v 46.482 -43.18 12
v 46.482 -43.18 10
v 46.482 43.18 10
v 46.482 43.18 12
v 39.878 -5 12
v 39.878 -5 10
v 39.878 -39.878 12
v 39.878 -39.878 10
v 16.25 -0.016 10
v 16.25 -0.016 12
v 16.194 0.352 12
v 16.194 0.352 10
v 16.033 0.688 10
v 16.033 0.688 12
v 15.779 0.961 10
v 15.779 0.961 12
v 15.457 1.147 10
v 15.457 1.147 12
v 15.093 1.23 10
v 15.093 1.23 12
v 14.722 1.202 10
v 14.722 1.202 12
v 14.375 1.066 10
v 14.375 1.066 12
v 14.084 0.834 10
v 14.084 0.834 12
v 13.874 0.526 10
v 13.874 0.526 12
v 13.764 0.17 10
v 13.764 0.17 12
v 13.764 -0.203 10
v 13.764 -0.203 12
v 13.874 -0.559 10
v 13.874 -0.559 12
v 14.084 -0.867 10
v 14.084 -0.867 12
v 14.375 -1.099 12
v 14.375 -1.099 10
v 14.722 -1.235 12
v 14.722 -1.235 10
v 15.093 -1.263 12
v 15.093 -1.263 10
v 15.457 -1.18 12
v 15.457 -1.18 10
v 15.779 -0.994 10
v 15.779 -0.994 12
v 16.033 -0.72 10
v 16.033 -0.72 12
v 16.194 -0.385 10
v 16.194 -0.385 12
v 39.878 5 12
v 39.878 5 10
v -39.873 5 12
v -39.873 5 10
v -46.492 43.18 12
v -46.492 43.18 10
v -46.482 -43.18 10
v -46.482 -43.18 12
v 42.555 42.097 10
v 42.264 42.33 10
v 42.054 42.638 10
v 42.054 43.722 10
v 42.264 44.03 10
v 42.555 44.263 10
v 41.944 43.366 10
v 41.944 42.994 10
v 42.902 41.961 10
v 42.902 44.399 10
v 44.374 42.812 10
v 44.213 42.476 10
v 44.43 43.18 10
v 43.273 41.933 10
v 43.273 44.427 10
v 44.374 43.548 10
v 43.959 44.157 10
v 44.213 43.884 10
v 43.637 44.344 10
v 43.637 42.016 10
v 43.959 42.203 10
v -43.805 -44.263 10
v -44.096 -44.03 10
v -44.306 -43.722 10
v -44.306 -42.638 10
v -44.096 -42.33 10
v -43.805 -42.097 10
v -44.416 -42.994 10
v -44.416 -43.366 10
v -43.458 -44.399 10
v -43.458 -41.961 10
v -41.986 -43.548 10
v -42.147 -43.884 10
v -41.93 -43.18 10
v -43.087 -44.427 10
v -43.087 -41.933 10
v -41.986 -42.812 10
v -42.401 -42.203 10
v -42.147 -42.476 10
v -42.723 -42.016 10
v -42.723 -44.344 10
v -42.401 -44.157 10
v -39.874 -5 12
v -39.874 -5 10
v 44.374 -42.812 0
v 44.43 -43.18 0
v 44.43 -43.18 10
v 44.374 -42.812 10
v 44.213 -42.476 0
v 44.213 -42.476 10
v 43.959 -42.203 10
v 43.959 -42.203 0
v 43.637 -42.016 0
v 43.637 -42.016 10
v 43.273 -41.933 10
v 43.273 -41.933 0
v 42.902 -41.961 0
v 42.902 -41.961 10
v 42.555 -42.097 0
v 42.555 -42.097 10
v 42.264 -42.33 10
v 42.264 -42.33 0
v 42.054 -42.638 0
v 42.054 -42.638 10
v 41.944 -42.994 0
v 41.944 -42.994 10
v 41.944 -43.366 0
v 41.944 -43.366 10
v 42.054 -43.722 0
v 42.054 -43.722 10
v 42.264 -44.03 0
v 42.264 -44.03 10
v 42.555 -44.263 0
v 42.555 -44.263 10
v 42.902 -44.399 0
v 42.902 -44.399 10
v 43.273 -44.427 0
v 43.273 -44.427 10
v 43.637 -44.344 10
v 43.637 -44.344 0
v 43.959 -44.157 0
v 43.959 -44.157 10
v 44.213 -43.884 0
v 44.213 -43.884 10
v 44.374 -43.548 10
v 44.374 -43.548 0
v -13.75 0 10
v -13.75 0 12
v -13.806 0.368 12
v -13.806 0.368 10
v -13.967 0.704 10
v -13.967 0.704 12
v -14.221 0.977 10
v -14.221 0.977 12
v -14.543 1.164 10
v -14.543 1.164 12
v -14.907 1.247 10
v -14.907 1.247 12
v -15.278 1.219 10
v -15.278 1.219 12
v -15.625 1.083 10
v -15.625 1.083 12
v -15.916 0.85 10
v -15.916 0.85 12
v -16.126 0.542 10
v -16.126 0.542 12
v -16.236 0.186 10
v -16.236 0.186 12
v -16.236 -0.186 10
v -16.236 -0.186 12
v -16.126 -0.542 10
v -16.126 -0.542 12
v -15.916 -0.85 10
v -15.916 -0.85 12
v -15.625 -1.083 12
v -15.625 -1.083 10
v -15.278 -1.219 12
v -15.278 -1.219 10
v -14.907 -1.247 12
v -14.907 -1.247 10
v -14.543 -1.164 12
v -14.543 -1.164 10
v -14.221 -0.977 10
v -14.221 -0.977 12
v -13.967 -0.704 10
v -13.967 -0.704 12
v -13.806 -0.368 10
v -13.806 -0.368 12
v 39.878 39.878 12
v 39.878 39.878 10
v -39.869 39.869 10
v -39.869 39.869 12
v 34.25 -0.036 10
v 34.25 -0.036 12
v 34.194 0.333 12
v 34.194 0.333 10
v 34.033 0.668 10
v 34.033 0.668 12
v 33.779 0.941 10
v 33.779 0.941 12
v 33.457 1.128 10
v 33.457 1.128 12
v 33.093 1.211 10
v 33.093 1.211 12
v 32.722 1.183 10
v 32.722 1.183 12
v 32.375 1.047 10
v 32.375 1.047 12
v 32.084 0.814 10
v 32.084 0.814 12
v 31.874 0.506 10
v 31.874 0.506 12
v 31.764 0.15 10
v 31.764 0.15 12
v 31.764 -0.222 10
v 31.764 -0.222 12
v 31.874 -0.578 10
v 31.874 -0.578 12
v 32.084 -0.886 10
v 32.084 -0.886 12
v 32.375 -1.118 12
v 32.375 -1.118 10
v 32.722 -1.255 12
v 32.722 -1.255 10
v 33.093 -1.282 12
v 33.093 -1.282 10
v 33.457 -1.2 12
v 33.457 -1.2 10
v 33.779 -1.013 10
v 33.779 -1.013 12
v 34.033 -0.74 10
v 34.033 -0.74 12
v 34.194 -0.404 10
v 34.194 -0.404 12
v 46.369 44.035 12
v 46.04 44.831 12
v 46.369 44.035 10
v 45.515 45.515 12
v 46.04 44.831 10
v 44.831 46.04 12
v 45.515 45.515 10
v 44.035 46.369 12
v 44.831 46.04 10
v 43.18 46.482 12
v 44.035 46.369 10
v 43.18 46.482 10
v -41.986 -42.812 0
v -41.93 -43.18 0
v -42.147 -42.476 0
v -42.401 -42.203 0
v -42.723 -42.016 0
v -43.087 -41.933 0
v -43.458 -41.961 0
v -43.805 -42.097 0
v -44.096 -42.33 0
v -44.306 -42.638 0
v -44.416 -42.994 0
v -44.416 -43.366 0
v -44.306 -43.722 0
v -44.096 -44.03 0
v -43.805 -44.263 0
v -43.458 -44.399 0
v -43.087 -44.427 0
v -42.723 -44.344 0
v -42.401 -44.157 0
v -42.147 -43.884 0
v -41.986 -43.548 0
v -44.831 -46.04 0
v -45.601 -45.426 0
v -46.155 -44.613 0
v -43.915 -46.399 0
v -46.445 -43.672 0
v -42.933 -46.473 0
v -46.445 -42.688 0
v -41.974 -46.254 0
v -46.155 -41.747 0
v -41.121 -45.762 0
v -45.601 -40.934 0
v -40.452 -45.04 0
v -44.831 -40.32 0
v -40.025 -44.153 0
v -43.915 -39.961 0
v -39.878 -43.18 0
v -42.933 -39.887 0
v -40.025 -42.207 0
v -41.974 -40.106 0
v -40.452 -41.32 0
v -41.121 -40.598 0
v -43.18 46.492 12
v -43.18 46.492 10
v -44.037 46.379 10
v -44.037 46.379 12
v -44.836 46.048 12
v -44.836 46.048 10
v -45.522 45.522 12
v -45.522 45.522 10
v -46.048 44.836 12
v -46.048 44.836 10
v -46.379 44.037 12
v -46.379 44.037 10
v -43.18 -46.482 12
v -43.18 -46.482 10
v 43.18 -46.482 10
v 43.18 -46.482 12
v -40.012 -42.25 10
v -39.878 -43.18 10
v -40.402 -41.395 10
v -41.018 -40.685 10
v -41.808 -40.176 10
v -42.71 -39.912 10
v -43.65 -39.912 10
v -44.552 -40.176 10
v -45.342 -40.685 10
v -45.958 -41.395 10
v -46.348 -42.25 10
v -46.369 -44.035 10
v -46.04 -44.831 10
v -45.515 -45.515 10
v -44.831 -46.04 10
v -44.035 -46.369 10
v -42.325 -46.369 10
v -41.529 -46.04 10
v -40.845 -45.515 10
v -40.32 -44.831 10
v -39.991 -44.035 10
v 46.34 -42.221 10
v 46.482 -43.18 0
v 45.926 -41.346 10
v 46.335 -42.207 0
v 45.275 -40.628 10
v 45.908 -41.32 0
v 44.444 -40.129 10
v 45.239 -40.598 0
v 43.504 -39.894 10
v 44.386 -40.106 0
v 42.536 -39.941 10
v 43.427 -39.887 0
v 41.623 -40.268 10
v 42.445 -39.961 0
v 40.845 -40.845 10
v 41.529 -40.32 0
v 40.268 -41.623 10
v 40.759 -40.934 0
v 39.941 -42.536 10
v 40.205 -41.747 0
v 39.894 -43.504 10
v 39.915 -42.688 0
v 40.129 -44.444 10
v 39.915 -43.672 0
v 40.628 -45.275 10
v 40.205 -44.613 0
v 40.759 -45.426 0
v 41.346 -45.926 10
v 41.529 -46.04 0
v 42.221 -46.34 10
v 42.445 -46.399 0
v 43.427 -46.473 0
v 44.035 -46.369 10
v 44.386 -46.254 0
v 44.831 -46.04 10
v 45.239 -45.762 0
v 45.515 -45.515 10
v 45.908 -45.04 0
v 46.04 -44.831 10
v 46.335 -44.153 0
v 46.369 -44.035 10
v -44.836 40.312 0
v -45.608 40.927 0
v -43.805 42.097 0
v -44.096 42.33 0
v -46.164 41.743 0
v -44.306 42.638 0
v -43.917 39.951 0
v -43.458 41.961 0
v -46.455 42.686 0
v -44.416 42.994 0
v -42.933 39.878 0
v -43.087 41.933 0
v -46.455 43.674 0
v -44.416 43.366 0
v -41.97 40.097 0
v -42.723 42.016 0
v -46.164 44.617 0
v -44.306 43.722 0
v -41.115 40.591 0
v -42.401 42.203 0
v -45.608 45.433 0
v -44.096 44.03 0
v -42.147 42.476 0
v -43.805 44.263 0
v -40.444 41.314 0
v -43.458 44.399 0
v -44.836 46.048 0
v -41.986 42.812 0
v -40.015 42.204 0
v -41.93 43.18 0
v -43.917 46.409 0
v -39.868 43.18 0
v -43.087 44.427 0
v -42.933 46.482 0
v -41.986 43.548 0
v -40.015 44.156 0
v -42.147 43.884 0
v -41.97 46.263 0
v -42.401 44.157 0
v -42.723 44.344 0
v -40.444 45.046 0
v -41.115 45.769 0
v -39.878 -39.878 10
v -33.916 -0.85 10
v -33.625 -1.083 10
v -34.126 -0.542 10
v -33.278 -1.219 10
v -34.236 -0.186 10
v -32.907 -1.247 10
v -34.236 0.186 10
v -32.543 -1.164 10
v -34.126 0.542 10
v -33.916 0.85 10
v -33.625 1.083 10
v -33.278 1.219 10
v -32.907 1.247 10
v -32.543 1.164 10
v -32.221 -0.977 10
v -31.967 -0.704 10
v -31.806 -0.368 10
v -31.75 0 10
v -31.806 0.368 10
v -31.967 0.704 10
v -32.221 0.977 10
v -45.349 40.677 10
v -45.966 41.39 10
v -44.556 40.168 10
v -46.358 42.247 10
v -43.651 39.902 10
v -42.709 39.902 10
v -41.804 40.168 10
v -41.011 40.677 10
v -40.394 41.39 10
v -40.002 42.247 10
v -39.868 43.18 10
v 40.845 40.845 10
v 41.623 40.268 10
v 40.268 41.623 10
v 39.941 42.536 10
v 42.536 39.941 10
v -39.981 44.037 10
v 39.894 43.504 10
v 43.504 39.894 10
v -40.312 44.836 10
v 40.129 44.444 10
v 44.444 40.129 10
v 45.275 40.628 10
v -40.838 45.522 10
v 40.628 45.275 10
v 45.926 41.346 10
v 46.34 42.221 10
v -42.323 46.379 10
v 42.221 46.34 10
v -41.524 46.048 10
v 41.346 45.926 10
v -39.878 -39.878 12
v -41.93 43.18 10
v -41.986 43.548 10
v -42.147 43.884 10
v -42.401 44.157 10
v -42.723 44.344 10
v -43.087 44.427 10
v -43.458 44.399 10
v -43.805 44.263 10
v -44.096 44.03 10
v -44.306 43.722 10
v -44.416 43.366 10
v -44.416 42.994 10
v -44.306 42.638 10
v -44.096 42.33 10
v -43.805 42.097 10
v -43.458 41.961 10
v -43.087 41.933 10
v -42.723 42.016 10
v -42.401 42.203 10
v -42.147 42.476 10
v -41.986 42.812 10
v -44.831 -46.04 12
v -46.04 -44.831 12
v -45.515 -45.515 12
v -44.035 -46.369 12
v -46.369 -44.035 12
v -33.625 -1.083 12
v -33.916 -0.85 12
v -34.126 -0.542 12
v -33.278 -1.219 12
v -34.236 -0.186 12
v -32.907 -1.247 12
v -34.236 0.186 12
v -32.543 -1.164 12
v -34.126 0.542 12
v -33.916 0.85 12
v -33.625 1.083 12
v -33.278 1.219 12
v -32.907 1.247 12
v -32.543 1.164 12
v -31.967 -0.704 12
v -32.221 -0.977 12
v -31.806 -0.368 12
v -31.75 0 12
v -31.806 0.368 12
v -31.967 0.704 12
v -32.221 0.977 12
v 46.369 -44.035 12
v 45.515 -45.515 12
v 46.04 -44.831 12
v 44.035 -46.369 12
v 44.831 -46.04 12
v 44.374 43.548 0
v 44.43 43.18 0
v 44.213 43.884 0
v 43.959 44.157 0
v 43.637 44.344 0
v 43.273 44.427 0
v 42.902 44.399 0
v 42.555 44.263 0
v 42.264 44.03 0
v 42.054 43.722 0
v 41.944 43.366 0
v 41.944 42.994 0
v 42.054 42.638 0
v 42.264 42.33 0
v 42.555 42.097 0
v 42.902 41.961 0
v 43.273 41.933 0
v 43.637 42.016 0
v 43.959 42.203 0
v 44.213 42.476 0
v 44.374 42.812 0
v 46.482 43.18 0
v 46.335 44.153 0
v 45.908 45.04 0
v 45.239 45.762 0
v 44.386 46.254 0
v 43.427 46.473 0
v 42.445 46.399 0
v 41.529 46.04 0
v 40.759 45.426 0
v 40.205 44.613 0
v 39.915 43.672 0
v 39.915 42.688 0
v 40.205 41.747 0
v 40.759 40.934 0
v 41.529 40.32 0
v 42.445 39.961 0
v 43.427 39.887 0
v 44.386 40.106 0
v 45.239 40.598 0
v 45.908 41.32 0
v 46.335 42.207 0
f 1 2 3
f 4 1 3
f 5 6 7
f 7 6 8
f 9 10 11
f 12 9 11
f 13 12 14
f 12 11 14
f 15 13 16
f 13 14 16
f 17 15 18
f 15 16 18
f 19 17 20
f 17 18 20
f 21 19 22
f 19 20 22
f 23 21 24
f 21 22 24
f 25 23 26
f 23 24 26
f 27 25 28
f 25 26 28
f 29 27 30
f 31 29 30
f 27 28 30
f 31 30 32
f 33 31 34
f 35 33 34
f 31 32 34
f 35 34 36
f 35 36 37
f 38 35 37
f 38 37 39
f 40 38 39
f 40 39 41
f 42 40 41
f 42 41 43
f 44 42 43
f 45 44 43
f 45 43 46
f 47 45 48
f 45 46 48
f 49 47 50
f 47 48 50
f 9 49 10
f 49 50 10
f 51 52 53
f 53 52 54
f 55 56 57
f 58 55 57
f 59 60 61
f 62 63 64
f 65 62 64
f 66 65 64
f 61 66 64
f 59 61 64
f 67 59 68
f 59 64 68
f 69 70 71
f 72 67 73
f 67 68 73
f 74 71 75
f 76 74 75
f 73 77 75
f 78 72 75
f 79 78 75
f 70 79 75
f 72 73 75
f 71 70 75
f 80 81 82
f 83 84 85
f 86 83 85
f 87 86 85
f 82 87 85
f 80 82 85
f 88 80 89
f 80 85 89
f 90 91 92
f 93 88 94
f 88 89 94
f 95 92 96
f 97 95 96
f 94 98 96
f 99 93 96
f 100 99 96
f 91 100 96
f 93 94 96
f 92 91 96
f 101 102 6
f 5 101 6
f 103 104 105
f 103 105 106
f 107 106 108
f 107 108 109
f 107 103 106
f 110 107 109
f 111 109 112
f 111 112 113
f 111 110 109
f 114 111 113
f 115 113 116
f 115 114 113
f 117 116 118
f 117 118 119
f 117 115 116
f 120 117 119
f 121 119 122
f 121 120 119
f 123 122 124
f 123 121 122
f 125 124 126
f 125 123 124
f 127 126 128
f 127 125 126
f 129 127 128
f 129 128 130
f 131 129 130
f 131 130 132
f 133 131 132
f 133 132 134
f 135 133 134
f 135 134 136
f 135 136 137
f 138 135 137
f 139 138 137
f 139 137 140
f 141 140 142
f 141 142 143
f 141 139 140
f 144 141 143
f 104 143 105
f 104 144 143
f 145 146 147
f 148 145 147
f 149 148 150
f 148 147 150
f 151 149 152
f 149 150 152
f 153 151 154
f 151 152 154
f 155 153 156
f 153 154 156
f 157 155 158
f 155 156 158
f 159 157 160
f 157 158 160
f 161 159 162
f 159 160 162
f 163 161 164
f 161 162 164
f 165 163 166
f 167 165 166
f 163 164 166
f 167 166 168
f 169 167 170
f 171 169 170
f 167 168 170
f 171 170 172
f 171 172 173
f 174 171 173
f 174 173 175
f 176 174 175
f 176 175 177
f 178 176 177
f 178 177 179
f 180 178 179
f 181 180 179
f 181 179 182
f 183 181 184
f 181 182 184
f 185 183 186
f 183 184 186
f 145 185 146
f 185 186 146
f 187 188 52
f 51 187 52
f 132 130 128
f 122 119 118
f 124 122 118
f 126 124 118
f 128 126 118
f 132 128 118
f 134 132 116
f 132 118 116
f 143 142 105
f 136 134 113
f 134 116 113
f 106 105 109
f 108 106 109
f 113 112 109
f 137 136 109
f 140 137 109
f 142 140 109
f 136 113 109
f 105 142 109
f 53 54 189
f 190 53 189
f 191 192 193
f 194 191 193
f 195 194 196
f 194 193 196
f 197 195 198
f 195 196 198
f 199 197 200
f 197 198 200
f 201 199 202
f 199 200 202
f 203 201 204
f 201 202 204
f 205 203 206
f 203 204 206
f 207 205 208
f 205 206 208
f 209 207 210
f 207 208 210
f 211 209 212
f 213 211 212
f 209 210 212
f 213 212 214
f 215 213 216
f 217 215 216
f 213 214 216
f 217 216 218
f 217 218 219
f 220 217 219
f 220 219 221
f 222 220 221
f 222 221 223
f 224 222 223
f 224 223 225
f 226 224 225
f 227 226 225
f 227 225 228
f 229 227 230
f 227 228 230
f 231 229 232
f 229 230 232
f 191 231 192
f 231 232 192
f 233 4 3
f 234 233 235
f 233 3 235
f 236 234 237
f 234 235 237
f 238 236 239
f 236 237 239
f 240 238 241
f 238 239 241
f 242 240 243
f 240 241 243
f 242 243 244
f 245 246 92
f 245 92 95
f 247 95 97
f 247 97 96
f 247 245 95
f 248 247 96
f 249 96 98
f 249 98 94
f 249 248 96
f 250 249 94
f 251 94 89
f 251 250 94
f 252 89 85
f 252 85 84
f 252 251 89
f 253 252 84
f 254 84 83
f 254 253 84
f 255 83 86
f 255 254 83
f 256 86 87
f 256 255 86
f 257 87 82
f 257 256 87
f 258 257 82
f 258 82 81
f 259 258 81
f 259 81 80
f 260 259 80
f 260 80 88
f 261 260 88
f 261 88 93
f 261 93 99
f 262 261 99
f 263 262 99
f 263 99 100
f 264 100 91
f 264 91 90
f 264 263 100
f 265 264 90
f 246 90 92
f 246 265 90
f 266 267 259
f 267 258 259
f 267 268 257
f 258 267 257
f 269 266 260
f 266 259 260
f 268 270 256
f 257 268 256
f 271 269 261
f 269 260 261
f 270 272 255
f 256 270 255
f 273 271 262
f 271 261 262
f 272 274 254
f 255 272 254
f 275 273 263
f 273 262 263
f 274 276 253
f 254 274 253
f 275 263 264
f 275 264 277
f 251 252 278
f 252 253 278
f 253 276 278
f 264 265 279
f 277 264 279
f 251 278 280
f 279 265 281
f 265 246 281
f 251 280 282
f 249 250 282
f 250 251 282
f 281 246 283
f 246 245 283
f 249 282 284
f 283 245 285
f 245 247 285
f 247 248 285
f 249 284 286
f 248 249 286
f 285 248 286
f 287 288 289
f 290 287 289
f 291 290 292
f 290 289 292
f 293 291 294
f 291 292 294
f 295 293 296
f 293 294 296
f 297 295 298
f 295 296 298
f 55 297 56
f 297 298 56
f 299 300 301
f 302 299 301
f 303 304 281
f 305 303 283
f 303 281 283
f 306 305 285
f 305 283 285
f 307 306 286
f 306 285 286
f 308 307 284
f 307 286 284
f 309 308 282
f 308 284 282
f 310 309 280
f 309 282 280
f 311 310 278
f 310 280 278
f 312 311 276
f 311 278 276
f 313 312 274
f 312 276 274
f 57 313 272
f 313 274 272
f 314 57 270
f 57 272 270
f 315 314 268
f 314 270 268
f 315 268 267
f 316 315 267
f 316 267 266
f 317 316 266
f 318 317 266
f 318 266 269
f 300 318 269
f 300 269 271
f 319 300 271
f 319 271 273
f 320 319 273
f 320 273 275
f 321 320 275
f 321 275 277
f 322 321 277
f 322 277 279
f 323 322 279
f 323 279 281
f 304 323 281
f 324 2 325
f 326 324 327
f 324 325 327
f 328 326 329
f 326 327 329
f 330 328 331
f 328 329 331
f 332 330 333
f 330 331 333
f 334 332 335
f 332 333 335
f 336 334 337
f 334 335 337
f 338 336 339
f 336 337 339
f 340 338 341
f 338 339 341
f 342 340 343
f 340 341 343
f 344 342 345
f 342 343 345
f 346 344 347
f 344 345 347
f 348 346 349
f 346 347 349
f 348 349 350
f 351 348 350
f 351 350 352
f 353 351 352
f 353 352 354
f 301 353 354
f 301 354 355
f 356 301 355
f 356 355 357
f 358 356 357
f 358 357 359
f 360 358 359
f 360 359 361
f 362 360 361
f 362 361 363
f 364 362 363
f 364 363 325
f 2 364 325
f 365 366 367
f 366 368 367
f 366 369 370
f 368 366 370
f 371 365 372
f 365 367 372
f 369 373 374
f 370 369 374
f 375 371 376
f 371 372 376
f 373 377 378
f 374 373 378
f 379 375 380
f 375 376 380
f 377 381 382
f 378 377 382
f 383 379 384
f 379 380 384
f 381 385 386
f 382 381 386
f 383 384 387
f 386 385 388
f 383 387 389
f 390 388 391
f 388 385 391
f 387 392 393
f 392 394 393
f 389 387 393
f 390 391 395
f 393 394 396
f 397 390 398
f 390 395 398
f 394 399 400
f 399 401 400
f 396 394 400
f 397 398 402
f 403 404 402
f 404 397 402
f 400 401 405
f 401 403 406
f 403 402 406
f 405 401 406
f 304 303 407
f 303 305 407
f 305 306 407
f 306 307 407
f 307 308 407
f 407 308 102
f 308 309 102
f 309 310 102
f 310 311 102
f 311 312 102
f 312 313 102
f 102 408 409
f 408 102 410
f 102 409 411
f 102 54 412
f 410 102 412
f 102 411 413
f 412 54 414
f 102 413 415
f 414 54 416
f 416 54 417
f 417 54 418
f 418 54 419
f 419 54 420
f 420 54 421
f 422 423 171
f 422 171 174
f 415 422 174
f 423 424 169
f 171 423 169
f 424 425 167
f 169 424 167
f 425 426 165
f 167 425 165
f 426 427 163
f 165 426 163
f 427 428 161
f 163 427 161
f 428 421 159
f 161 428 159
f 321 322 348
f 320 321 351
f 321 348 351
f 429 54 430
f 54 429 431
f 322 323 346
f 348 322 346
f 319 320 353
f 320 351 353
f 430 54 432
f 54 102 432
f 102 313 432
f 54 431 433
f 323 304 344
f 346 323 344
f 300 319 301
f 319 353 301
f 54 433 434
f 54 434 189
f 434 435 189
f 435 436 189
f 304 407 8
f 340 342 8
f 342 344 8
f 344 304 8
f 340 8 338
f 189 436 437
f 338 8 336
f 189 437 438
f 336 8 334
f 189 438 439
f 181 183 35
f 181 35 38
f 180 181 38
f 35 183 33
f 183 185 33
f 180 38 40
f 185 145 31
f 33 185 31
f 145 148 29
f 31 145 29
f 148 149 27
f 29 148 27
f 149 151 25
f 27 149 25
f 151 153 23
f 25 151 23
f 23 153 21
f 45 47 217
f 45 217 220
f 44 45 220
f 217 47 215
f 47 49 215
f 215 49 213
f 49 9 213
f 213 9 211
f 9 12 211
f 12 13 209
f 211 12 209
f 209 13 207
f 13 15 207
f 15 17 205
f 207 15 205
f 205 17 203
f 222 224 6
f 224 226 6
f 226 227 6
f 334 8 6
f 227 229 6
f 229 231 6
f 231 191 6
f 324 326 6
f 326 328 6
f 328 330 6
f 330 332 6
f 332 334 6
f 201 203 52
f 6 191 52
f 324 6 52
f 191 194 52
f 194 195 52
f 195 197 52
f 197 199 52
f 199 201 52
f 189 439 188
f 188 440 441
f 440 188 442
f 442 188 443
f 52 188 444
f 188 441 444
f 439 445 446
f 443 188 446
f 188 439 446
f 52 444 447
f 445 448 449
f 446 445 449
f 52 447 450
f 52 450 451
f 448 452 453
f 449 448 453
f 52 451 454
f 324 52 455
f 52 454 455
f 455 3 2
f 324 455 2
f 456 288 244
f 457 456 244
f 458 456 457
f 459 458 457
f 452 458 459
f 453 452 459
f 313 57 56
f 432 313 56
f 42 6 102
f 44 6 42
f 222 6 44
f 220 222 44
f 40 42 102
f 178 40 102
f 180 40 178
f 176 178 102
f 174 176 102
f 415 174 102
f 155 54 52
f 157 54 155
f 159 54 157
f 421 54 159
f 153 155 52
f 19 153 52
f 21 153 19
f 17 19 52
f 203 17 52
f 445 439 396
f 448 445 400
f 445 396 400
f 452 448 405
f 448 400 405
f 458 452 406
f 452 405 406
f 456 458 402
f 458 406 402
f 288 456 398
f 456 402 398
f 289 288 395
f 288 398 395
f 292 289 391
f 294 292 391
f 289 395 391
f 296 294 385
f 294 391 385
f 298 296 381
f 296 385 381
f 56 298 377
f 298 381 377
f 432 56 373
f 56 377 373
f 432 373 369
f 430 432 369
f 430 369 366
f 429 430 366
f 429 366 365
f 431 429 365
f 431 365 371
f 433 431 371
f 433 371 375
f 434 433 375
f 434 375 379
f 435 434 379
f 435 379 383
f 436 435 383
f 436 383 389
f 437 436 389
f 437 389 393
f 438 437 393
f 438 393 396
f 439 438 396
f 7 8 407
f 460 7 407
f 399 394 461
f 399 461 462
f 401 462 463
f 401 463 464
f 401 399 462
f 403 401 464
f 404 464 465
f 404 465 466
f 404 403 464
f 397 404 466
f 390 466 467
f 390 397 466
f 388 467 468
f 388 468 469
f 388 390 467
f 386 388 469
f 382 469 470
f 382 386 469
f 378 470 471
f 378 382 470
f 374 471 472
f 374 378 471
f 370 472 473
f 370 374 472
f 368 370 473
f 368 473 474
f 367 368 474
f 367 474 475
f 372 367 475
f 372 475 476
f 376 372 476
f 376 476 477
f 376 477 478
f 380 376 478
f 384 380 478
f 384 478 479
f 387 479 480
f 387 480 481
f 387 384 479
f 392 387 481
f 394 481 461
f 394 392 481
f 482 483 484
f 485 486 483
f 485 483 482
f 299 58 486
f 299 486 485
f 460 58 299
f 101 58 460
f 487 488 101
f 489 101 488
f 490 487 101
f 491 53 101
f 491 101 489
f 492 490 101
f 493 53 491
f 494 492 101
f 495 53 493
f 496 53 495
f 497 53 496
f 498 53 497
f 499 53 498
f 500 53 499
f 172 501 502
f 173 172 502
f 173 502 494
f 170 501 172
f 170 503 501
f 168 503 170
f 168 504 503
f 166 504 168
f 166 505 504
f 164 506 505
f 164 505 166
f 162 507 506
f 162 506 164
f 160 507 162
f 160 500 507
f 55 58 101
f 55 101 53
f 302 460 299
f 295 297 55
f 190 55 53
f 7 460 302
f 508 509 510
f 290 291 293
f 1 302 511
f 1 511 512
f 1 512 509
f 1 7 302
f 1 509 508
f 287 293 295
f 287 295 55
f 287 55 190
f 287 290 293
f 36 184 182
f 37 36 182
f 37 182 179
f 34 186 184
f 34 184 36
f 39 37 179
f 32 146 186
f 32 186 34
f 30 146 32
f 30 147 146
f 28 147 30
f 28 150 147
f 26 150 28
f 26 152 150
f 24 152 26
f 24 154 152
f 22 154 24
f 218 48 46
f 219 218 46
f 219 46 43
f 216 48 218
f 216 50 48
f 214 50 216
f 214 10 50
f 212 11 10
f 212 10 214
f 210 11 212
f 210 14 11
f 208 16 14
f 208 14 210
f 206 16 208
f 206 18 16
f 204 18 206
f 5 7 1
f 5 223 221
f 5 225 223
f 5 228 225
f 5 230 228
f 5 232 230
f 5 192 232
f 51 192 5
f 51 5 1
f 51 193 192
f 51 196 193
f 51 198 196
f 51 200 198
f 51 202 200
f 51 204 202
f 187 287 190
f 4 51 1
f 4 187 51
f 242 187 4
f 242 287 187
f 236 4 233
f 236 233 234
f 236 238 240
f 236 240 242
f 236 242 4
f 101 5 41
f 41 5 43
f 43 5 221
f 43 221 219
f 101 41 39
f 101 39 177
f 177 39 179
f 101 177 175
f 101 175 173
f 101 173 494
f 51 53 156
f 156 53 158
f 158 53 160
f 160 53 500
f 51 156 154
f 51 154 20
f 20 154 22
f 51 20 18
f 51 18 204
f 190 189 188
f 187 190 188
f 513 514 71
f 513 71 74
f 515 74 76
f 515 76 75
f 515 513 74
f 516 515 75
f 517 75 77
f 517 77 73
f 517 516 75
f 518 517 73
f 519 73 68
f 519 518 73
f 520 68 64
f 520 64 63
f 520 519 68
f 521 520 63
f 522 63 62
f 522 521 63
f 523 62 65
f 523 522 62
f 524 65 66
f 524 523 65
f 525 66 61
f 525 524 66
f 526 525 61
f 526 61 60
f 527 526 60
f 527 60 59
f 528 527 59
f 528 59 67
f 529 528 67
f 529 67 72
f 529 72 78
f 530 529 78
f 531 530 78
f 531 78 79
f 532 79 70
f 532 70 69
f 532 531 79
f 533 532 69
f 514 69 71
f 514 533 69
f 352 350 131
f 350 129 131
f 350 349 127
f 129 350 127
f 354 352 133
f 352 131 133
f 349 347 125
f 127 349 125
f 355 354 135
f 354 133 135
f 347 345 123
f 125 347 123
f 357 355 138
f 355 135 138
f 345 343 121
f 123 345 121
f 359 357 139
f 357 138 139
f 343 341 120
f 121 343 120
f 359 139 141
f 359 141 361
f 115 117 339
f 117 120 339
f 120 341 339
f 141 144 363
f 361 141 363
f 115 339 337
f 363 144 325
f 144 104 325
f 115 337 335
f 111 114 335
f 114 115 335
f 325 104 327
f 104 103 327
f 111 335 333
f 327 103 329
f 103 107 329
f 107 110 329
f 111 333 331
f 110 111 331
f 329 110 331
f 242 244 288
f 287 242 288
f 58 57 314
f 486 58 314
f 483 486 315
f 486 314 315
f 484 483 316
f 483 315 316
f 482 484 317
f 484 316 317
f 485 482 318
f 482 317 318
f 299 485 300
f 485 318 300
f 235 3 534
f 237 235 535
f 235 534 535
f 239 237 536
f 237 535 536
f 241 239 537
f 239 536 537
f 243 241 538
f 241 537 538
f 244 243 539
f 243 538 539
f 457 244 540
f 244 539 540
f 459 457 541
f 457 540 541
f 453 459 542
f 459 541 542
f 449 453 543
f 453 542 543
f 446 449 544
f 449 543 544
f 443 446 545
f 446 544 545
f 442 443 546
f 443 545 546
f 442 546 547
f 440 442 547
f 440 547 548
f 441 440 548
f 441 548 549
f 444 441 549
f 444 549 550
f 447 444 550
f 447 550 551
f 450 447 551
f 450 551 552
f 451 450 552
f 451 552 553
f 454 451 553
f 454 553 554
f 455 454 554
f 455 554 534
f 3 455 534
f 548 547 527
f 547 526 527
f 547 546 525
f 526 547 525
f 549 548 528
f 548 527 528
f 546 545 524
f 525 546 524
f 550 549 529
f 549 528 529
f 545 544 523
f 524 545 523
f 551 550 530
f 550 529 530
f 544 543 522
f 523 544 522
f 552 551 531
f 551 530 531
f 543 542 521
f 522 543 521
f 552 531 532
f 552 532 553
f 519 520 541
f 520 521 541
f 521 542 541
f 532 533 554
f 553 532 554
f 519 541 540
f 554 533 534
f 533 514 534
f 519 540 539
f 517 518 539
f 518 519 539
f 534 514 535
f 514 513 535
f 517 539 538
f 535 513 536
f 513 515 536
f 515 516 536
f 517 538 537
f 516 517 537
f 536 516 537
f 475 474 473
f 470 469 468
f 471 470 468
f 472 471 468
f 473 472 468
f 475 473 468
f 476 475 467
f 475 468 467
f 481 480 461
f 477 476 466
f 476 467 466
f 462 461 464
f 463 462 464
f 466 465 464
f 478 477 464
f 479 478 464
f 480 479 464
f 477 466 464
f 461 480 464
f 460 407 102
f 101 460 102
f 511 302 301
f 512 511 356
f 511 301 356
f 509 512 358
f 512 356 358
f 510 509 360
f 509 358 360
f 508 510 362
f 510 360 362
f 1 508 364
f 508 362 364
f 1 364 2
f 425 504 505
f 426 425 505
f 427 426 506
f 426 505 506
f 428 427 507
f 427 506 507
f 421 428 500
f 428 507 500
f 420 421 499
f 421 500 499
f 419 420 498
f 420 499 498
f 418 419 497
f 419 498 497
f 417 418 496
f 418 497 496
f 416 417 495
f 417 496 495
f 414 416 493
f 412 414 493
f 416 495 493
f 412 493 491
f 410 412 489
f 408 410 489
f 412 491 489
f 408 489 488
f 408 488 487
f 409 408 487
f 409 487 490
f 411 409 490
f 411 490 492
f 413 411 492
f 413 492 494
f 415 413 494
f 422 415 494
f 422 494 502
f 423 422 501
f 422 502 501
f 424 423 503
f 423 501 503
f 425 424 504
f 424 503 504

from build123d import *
from build123d.topology import SkipClean

# Parameters (mm, degrees)
SKIZZE2_R                         = 3.311754822
SKIZZE2_R_2                       = 1.25
AUFSATZ_LINEAR_AUSTRAGEN1_DEPTH   = 10
SKIZZE2_R_3                       = 3.302
AUFSATZ_LINEAR_AUSTRAGEN1_2_DEPTH = 10
AUFSATZ_LINEAR_AUSTRAGEN1_3_DEPTH = 10
AUFSATZ_LINEAR_AUSTRAGEN1_4_DEPTH = 10
AUFSATZ_LINEAR_AUSTRAGEN2_DEPTH   = 2
SKIZZE4_R                         = 1.25
SCHNITT_LINEAR_AUSTRAGEN1_DEPTH   = 2


with BuildPart() as part:
    # Skizze2 → Aufsatz-Linear austragen1 (new body)
    with BuildSketch(Plane.XY):
        with Locations((-43.18, 43.18)):
            Circle(SKIZZE2_R)
        with Locations((-43.18, 43.18)):
            Circle(SKIZZE2_R_2, mode=Mode.SUBTRACT)
    extrude(amount=AUFSATZ_LINEAR_AUSTRAGEN1_DEPTH)



with BuildPart() as body_2:
    # Skizze2 → Aufsatz-Linear austragen1 2 (new body)
    with BuildSketch(Plane.XY):
        with Locations((-43.18, -43.18)):
            Circle(SKIZZE2_R_3)
        with Locations((-43.18, -43.18)):
            Circle(SKIZZE2_R_2, mode=Mode.SUBTRACT)
    extrude(amount=AUFSATZ_LINEAR_AUSTRAGEN1_2_DEPTH)


with BuildPart() as body_3:
    # Skizze2 → Aufsatz-Linear austragen1 3 (new body)
    with BuildSketch(Plane.XY):
        with Locations((43.18, -43.18)):
            Circle(SKIZZE2_R_3)
        with Locations((43.18, -43.18)):
            Circle(SKIZZE2_R_2, mode=Mode.SUBTRACT)
    extrude(amount=AUFSATZ_LINEAR_AUSTRAGEN1_3_DEPTH)


with BuildPart() as body_4:
    # Skizze2 → Aufsatz-Linear austragen1 4 (new body)
    with BuildSketch(Plane.XY):
        with Locations((43.18, 43.18)):
            Circle(SKIZZE2_R_3)
        with Locations((43.18, 43.18)):
            Circle(SKIZZE2_R_2, mode=Mode.SUBTRACT)
    extrude(amount=AUFSATZ_LINEAR_AUSTRAGEN1_4_DEPTH)


with BuildPart() as part_1:
    with SkipClean():  # the faces are left unmerged after this step: merging them gives an invalid solid
        add(part.part)

        add(body_2.part)  # Aufsatz-Linear austragen2 merges body 2

        add(body_3.part)  # Aufsatz-Linear austragen2 merges body 3

        add(body_4.part)  # Aufsatz-Linear austragen2 merges body 4
        # Skizze3 → Aufsatz-Linear austragen2 (add)
        with BuildSketch(Plane.XY.offset(10)):
            with BuildLine():
                ThreePointArc((46.482, 43.18), (45.514866591, 45.514866591), (43.18, 46.482))
                Line((43.18, 46.482), (-43.18, 46.491754822))
                ThreePointArc((-43.18, 46.491754822), (-45.521764292, 45.521764292), (-46.491754822, 43.18))
                Line((-46.491754822, 43.18), (-46.482, -43.18))
                ThreePointArc((-46.482, -43.18), (-45.514866591, -45.514866591), (-43.18, -46.482))
                Line((-43.18, -46.482), (43.18, -46.482))
                ThreePointArc((43.18, -46.482), (45.514866591, -45.514866591), (46.482, -43.18))
                Line((46.482, -43.18), (46.482, 43.18))
            make_face()
            Polygon((39.878, -39.878), (-39.877627022, -39.878), (-39.873687387, -5.000187008), (39.878, -5.000187008), align=None, mode=Mode.SUBTRACT)
            Polygon((39.878, 39.877627022), (39.878, 4.999812928), (-39.872557834, 4.999812928), (-39.868619216, 39.868619216), align=None, mode=Mode.SUBTRACT)
        extrude(amount=AUFSATZ_LINEAR_AUSTRAGEN2_DEPTH)

    # Skizze4 → Schnitt-Linear austragen1 (cut)
    with SkipClean():  # the faces are left unmerged after this step: merging them gives an invalid solid
        with BuildSketch(Plane.XY.offset(12)):
            with Locations((-33, 0)):
                Circle(SKIZZE4_R)
            with Locations((-15, 0)):
                Circle(SKIZZE4_R)
            with Locations((32.999980451, -0.035919632)):
                Circle(SKIZZE4_R)
            with Locations((14.999991114, -0.016327105)):
                Circle(SKIZZE4_R)
        extrude(amount=-SCHNITT_LINEAR_AUSTRAGEN1_DEPTH, mode=Mode.SUBTRACT)


solid = part_1.part
